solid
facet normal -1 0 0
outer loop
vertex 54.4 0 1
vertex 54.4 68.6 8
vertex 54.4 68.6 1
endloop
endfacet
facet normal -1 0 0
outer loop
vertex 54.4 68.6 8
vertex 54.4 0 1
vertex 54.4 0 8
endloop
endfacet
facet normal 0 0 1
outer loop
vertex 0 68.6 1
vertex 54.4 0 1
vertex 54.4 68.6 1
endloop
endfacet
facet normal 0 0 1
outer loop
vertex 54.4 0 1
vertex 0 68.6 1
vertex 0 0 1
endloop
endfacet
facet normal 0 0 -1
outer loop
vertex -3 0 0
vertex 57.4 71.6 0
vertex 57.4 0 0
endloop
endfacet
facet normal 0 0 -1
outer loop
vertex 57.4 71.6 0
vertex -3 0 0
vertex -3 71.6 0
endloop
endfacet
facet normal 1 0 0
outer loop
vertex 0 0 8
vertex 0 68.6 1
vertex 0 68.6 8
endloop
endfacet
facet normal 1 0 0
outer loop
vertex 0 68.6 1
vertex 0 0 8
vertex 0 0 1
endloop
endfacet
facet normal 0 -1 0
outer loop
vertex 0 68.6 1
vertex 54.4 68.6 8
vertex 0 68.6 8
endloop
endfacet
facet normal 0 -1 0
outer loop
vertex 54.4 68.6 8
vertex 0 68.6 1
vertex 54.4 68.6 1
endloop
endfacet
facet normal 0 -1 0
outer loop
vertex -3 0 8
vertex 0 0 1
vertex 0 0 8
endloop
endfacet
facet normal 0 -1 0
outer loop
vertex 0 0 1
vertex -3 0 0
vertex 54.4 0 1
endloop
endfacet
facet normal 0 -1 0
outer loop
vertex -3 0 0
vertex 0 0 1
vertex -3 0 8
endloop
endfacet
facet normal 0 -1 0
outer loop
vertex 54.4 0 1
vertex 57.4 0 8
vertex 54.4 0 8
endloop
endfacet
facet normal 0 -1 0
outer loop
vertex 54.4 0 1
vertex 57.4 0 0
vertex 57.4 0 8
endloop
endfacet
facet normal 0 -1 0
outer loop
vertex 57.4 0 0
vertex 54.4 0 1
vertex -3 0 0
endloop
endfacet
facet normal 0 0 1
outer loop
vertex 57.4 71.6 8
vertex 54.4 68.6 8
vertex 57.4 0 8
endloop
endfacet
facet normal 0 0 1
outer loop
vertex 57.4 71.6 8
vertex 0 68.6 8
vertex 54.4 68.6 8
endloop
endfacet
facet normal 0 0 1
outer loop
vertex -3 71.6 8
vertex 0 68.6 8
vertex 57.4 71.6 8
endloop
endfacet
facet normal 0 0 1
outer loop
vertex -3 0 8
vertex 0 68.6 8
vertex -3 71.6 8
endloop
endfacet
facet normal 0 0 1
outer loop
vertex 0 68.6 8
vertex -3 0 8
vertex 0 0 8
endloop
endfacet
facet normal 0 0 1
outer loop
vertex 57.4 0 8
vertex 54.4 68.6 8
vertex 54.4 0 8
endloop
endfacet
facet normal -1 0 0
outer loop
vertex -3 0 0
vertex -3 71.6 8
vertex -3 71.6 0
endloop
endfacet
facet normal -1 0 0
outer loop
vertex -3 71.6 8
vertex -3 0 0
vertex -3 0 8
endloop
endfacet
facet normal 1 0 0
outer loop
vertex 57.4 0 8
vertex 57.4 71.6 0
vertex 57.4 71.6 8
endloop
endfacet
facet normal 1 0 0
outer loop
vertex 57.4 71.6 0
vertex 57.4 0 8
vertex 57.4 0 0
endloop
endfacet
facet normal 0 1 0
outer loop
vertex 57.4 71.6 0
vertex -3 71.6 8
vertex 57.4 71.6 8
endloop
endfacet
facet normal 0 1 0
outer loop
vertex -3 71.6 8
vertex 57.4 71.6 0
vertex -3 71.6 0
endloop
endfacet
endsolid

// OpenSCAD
// file: controller_case_common.scad
// defines common functionality for the controller case for the RGB lamp

floor_thickness = 1.0;
arduino_width = 54.4;
arduino_length = 68.6;
wall_thickness = 3.0;
// main file
// Creates the bottom part of the case for the lamp controller unit, which is where the Arduino Uno lives
// Note that this assumes you have downloaded the Arduino Uno dxf file at http://arduino.cc/documents/Arduino%20Uno.dxf
// and have it in the local directory.

include <controller_case_common.scad>;
guard_rail_height = floor_thickness * 8.0;

cube([arduino_width, arduino_length, floor_thickness]);

translate([-wall_thickness,0,0])
  cube([wall_thickness, arduino_length, guard_rail_height]);

translate([arduino_width,0,0])
  cube([wall_thickness, arduino_length, guard_rail_height]);

translate([-wall_thickness, arduino_length, 0])
  cube([arduino_width + (wall_thickness * 2), wall_thickness, guard_rail_height]);
